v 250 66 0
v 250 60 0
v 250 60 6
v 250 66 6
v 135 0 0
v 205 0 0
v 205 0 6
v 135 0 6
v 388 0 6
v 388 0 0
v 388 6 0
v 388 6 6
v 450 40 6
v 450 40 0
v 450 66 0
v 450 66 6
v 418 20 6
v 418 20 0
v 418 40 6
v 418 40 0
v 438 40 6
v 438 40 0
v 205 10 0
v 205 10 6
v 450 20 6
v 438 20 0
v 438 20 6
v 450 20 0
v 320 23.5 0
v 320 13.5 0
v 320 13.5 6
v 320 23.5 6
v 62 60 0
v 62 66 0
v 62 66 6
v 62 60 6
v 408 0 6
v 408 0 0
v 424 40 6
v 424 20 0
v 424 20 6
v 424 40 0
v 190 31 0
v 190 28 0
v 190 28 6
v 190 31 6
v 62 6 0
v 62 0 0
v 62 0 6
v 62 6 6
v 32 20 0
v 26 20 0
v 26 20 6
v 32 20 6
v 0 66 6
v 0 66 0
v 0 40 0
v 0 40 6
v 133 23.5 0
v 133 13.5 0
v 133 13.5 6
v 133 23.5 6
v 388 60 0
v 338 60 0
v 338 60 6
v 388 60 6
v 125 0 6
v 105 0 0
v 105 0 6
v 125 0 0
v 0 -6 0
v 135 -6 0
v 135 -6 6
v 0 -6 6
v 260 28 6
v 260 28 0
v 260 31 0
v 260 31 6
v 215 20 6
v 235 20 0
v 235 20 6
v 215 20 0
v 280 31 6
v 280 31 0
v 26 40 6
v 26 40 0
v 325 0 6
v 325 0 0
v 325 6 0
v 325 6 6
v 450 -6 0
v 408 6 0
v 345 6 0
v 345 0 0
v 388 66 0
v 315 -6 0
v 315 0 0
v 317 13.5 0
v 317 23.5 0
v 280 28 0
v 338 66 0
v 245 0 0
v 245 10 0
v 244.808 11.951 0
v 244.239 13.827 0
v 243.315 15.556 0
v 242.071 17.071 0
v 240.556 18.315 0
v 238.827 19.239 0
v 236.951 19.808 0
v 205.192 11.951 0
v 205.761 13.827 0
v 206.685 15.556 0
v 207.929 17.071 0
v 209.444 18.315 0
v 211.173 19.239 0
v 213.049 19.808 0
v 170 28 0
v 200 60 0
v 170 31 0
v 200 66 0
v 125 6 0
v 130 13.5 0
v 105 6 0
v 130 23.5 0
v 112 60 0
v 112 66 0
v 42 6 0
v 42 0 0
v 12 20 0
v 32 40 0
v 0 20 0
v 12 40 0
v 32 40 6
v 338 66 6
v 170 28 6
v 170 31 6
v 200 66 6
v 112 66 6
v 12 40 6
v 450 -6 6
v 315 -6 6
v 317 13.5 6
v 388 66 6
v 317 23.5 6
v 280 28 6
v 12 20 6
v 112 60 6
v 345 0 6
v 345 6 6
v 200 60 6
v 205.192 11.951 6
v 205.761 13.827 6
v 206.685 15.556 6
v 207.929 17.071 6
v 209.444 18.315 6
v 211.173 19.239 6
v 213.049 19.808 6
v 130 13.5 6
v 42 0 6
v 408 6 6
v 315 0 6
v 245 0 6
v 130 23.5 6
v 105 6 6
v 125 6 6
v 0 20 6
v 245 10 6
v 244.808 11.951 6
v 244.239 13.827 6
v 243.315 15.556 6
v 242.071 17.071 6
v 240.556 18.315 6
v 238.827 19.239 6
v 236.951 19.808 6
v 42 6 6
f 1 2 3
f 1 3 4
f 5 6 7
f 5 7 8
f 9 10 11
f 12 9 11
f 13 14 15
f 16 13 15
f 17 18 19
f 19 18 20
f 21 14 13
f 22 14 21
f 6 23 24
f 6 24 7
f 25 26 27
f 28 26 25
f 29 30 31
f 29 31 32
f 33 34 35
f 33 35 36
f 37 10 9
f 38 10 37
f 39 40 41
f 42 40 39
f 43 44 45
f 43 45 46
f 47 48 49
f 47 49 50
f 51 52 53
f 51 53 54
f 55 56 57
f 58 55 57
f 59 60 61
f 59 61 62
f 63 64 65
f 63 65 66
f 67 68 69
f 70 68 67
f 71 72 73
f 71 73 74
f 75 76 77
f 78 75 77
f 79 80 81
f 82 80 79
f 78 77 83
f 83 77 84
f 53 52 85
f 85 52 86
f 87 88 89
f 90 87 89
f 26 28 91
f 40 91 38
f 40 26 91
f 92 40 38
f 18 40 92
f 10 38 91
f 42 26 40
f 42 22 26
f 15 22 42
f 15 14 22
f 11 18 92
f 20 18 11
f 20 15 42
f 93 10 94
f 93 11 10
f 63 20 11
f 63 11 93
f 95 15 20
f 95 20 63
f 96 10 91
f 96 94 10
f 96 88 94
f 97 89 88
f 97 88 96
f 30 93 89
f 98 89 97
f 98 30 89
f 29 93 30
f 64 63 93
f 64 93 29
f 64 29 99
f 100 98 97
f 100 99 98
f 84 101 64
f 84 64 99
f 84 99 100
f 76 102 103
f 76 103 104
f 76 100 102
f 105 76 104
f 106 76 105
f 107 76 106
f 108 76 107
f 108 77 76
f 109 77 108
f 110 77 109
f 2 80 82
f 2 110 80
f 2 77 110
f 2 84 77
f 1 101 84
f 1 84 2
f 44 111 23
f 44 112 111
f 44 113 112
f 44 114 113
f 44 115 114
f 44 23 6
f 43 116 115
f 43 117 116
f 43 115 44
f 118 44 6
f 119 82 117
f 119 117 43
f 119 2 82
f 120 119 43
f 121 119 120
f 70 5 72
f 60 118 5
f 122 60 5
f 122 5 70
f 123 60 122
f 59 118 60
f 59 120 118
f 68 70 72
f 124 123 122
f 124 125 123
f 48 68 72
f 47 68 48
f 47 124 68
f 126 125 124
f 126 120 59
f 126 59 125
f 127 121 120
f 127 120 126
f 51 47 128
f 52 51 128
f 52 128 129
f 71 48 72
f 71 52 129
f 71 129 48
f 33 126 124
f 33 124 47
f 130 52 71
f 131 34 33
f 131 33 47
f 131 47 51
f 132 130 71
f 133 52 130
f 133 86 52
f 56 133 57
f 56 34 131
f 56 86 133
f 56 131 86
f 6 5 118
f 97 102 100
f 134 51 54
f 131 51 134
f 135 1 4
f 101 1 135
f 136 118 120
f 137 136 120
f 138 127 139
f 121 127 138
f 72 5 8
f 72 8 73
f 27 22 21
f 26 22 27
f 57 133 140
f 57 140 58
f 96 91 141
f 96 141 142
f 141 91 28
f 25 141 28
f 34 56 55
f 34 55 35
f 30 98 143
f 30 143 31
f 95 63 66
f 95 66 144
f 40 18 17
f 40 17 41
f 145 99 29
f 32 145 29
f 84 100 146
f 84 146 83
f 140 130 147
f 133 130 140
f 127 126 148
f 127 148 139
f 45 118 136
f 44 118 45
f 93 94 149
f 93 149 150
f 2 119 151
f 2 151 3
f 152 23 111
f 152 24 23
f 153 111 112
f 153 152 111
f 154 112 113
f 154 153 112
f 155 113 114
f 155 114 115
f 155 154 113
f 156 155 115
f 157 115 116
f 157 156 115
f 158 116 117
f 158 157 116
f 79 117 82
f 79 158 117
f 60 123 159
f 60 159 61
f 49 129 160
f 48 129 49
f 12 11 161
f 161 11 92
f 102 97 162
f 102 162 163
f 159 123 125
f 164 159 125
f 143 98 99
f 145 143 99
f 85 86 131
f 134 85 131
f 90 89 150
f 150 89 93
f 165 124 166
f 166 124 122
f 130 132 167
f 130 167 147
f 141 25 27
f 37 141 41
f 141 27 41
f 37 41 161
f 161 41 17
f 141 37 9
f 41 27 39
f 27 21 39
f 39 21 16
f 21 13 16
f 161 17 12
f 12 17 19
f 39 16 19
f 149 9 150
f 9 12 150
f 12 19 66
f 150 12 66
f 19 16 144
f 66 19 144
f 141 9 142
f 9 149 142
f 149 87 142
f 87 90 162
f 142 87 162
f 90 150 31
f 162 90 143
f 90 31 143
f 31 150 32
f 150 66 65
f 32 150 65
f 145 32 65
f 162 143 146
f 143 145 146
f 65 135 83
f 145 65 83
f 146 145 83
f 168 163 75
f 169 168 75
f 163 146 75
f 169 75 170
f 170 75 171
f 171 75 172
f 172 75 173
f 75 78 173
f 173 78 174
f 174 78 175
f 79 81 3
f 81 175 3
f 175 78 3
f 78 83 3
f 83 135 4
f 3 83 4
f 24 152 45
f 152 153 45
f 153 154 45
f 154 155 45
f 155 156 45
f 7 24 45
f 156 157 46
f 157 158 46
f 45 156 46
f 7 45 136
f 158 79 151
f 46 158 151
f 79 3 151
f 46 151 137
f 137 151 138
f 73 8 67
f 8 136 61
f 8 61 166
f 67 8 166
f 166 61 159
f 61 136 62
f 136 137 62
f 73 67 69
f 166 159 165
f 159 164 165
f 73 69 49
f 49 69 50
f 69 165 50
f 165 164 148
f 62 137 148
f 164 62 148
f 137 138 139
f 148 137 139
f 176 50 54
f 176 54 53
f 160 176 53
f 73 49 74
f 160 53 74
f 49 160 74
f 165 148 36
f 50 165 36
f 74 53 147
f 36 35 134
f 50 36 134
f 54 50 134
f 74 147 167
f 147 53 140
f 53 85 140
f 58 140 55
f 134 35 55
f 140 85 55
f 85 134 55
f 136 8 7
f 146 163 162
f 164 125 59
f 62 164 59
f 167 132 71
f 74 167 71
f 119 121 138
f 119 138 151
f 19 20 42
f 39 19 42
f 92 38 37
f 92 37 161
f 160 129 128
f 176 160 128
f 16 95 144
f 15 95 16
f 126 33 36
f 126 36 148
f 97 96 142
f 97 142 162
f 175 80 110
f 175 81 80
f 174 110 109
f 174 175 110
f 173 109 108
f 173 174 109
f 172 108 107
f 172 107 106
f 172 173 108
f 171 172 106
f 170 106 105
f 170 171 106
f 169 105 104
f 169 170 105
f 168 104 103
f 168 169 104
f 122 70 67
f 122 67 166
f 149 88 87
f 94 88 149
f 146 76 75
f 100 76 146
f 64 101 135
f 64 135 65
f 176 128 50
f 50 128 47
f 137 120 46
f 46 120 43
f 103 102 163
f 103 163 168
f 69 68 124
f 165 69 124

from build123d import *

# Parameters (mm, degrees)
SKETCH_1_W      = 20
SKETCH_1_H      = 6
SKETCH_1_W_2    = 6
SKETCH_1_H_2    = 20
SKETCH_1_W_3    = 3
SKETCH_1_H_3    = 10
SKETCH_1_H_4    = 3
EXTRUDE_1_DEPTH = 6
FILLET_1_R      = 10
FILLET_2_R      = 10


with BuildPart() as part:
    # Эскиз1 → Бобышка-Вытянуть1 (new body)
    with BuildSketch(Plane.XY):
        Polygon((0, 60), (0, 66), (62, 66), (62, 60), (112, 60), (112, 66), (200, 66), (200, 60), (250, 60), (250, 66), (338, 66), (338, 60), (388, 60), (388, 66), (450, 66), (450, 60), (450, 40), (438, 40), (438, 20), (450, 20), (450, 0), (450, -6), (315, -6), (315, 0), (245, 0), (245, 20), (205, 20), (205, 0), (135, 0), (135, -6), (0, -6), (0, 0), (0, 20), (12, 20), (12, 40), (0, 40), align=None)
        with Locations((115, 3)):
            Rectangle(SKETCH_1_W, SKETCH_1_H, mode=Mode.SUBTRACT)
        with Locations((335, 3)):
            Rectangle(SKETCH_1_W, SKETCH_1_H, mode=Mode.SUBTRACT)
        with Locations((29, 30)):
            Rectangle(SKETCH_1_W_2, SKETCH_1_H_2, mode=Mode.SUBTRACT)
        with Locations((421, 30)):
            Rectangle(SKETCH_1_W_2, SKETCH_1_H_2, mode=Mode.SUBTRACT)
        with Locations((398, 3)):
            Rectangle(SKETCH_1_W, SKETCH_1_H, mode=Mode.SUBTRACT)
        with Locations((52, 3)):
            Rectangle(SKETCH_1_W, SKETCH_1_H, mode=Mode.SUBTRACT)
        with Locations((318.5, 18.5)):
            Rectangle(SKETCH_1_W_3, SKETCH_1_H_3, mode=Mode.SUBTRACT)
        with Locations((131.5, 18.5)):
            Rectangle(SKETCH_1_W_3, SKETCH_1_H_3, mode=Mode.SUBTRACT)
        with Locations((180, 29.5)):
            Rectangle(SKETCH_1_W, SKETCH_1_H_4, mode=Mode.SUBTRACT)
        with Locations((270, 29.5)):
            Rectangle(SKETCH_1_W, SKETCH_1_H_4, mode=Mode.SUBTRACT)
    extrude(amount=EXTRUDE_1_DEPTH)

    # Скругление1
    fillet_1_edges = [part.edges().sort_by_distance(p)[0] for p in [
        (205, 20, 3),
    ]]
    fillet(fillet_1_edges, radius=FILLET_1_R)

    # Скругление2
    fillet_2_edges = [part.edges().sort_by_distance(p)[0] for p in [
        (245, 20, 3),
    ]]
    fillet(fillet_2_edges, radius=FILLET_2_R)


solid = part.part
